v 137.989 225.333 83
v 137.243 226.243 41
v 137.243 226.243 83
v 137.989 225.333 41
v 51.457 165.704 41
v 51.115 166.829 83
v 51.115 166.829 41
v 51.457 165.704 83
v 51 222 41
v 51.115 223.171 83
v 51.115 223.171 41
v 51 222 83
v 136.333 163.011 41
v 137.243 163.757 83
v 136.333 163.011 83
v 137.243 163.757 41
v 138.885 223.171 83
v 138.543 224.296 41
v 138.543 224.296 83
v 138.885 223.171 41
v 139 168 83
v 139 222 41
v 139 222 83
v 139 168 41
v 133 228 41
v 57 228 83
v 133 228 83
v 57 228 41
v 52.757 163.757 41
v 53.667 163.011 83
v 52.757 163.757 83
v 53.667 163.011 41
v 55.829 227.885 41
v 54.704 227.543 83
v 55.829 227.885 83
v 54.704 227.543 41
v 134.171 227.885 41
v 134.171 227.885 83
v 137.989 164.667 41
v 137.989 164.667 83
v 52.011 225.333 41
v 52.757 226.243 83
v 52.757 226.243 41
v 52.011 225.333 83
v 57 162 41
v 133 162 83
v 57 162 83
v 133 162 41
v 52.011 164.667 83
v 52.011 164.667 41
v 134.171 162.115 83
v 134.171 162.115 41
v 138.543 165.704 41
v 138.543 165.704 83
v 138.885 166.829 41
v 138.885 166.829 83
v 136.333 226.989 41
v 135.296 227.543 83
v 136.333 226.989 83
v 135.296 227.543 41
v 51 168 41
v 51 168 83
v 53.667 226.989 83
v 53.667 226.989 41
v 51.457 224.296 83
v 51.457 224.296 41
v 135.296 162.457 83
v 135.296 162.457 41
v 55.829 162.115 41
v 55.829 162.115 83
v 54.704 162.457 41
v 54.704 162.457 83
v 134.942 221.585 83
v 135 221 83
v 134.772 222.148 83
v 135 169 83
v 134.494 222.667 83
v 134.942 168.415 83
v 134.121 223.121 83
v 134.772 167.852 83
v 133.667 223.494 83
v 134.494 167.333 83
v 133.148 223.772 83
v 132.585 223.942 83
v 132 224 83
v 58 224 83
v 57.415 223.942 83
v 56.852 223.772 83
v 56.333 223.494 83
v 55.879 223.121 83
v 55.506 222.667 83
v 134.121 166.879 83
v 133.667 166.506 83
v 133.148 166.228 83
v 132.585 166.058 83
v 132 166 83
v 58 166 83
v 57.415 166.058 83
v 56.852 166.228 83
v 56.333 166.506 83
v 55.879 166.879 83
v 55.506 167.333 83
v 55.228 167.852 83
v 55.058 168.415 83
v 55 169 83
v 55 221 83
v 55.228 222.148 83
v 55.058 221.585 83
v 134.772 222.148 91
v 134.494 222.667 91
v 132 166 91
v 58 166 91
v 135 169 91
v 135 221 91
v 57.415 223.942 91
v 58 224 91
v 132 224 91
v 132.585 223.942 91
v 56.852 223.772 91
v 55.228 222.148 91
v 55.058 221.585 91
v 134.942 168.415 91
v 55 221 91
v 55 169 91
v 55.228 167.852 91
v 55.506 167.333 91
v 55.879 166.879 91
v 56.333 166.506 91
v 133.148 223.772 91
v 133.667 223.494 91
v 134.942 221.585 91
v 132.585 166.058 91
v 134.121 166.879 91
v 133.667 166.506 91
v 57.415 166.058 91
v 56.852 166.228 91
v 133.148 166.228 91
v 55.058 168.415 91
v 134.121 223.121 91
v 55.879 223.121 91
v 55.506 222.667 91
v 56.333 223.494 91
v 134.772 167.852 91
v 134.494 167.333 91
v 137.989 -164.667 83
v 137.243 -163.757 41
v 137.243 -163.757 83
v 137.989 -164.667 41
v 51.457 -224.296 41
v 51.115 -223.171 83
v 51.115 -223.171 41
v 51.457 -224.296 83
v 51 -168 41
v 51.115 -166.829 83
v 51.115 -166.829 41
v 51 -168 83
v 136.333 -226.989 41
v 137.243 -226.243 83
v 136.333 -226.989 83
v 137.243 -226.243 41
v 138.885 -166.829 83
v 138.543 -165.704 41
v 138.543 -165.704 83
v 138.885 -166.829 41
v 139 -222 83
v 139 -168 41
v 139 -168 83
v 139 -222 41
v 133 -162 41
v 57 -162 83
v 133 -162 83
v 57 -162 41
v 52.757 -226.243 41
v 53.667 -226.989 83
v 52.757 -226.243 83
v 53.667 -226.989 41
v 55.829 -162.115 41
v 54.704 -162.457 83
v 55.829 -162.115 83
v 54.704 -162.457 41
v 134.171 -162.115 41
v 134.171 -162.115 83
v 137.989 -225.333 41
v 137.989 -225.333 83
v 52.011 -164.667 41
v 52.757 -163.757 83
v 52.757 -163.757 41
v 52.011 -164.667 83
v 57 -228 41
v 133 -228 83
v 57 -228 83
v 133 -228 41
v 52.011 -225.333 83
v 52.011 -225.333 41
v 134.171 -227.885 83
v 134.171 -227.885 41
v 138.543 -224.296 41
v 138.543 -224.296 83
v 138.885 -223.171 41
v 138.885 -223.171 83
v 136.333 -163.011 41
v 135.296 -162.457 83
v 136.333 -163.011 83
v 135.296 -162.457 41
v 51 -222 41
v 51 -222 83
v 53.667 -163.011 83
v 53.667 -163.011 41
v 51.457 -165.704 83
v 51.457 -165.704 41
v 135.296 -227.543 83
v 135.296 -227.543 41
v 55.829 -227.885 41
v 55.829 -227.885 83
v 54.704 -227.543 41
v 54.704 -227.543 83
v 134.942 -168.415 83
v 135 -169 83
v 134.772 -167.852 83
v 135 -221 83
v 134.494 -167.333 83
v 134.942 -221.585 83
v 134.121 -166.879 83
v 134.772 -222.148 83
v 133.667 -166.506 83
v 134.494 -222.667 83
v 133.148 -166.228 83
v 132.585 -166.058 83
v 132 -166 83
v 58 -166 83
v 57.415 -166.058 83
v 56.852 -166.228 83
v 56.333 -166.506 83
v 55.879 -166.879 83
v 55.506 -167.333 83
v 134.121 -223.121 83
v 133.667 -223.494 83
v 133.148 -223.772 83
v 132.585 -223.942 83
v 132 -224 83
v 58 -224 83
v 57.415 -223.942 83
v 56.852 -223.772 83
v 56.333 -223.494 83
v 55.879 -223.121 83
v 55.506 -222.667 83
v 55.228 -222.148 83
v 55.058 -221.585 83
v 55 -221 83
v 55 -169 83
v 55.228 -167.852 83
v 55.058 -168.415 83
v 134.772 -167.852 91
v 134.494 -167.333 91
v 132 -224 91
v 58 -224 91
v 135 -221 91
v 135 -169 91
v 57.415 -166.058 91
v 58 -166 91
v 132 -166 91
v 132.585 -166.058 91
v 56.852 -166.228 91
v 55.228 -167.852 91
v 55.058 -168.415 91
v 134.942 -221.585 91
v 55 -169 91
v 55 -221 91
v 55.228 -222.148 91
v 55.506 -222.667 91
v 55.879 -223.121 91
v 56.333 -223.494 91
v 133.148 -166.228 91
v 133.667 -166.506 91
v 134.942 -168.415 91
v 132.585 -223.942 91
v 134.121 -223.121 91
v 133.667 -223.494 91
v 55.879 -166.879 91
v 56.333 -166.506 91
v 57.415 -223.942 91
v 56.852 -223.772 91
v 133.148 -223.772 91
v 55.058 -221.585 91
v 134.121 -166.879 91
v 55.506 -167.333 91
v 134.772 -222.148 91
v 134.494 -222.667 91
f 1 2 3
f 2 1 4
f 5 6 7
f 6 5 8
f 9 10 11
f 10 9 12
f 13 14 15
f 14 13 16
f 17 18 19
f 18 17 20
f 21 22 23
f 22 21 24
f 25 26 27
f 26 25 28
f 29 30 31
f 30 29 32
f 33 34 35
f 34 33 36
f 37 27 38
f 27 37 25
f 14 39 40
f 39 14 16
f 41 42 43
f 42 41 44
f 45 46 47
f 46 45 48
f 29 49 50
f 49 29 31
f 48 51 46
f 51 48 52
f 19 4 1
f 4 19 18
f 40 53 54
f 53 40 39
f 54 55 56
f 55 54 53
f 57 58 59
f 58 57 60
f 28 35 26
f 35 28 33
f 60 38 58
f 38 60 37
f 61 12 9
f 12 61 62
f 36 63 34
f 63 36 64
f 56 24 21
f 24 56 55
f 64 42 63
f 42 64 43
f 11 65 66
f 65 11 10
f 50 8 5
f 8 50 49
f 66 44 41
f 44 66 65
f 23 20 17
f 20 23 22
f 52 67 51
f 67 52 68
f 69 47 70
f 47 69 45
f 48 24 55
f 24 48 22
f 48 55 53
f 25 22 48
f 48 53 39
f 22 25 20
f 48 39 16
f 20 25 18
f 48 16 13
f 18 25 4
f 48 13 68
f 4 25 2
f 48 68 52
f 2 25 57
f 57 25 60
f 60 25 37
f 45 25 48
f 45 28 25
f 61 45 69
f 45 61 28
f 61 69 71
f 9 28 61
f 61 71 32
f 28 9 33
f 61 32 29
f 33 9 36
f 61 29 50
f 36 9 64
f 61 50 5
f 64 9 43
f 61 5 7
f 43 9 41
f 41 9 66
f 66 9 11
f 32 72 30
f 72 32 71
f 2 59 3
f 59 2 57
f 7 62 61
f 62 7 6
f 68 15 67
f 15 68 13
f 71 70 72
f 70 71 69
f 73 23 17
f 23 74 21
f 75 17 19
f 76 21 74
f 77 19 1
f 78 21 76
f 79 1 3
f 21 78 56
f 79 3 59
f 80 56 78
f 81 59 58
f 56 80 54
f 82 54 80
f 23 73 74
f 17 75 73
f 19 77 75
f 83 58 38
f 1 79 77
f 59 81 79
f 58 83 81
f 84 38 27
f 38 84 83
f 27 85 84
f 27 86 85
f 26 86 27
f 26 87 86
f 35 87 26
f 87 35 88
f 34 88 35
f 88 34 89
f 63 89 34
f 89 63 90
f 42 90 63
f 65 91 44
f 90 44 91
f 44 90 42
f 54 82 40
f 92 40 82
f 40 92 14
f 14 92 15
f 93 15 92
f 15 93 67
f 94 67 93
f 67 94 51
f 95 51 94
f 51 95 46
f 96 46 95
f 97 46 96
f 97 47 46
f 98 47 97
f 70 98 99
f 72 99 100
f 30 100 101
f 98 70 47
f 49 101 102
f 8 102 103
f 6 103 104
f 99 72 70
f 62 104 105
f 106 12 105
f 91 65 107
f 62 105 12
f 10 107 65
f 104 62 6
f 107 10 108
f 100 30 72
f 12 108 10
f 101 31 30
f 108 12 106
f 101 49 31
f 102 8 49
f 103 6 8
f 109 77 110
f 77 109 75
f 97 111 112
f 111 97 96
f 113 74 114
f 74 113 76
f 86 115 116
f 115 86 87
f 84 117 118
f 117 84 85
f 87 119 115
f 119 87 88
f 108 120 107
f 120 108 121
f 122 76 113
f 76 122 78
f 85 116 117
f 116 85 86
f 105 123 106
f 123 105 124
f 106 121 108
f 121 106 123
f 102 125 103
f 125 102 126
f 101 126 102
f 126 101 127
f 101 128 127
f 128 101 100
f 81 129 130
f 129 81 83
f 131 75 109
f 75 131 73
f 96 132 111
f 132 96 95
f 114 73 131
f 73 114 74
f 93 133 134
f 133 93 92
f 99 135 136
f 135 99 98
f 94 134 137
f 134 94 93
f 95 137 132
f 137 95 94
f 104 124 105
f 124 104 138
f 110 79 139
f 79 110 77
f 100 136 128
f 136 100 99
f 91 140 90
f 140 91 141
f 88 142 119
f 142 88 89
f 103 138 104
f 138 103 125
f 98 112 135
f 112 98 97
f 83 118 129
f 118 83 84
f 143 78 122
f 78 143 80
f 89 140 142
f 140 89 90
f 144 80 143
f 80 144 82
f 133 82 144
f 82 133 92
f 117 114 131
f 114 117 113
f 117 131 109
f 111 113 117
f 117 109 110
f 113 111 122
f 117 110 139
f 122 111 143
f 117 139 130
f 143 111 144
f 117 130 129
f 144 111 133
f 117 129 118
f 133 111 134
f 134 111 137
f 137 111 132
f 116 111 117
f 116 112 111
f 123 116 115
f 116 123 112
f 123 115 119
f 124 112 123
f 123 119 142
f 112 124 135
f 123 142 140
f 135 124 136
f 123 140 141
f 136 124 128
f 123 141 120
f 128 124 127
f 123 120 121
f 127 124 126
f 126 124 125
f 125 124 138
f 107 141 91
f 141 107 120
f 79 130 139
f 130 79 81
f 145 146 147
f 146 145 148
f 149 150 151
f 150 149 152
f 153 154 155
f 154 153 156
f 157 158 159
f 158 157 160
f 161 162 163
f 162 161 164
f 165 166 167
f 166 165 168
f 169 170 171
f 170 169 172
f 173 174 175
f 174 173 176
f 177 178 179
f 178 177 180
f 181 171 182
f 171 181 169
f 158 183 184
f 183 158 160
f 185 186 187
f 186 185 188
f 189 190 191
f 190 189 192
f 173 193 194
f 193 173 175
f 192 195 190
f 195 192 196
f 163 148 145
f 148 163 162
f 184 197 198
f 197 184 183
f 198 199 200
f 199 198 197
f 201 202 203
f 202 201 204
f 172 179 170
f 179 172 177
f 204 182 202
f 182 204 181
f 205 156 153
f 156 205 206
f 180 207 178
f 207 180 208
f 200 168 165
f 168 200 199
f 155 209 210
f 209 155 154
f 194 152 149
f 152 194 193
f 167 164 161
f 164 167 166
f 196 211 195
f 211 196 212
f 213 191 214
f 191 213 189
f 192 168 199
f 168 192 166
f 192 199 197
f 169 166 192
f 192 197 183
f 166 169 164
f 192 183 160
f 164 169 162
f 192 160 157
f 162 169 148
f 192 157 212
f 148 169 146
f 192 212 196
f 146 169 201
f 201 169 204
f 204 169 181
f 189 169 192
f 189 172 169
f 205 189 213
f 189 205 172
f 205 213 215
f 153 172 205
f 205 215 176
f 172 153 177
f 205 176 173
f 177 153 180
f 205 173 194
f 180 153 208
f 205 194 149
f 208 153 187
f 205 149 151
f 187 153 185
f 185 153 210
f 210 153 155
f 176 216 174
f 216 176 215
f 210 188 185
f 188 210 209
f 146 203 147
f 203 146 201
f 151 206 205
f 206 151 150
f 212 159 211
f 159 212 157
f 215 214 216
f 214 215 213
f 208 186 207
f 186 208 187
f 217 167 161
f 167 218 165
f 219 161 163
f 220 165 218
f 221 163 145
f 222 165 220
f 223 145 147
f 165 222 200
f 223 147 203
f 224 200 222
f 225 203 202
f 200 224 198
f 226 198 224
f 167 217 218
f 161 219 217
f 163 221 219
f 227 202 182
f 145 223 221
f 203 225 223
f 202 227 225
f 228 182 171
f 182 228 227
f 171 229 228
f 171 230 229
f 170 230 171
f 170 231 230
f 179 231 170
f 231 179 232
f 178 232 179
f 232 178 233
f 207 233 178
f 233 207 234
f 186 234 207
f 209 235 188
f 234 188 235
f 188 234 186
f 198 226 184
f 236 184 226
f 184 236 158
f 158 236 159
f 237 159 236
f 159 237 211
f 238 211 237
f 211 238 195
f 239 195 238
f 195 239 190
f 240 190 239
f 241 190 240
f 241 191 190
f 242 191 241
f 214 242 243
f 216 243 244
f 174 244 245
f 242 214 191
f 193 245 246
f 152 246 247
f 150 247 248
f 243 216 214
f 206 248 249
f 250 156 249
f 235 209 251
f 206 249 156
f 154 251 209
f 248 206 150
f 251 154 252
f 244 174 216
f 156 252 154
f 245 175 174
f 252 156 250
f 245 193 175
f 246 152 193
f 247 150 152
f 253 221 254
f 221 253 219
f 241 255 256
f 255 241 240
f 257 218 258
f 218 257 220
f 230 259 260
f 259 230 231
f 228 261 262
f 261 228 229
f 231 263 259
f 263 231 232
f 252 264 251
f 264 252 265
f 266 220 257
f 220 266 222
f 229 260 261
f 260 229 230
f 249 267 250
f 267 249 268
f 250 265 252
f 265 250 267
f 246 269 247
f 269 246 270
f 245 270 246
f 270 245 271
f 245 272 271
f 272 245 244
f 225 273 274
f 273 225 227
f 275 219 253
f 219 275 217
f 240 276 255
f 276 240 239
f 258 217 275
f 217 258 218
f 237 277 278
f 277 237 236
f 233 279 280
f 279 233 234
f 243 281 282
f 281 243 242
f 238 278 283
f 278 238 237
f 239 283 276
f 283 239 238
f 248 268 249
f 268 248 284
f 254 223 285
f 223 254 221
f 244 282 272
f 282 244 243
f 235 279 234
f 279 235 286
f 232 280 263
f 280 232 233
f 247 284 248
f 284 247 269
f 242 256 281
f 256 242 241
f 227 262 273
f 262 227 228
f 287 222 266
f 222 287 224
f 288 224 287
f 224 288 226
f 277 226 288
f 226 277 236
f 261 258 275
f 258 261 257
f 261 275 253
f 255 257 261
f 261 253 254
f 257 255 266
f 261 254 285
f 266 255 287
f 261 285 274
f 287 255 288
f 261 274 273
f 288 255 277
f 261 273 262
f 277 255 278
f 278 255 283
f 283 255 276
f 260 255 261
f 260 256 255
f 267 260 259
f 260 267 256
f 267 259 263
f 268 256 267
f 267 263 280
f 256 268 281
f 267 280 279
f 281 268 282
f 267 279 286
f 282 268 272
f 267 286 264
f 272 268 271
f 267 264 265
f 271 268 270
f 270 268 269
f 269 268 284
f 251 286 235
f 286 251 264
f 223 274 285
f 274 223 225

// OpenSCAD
export_only = true;
include <main.scad>
union() {
    motor_driver(1);
    motor_driver(-1);
}
